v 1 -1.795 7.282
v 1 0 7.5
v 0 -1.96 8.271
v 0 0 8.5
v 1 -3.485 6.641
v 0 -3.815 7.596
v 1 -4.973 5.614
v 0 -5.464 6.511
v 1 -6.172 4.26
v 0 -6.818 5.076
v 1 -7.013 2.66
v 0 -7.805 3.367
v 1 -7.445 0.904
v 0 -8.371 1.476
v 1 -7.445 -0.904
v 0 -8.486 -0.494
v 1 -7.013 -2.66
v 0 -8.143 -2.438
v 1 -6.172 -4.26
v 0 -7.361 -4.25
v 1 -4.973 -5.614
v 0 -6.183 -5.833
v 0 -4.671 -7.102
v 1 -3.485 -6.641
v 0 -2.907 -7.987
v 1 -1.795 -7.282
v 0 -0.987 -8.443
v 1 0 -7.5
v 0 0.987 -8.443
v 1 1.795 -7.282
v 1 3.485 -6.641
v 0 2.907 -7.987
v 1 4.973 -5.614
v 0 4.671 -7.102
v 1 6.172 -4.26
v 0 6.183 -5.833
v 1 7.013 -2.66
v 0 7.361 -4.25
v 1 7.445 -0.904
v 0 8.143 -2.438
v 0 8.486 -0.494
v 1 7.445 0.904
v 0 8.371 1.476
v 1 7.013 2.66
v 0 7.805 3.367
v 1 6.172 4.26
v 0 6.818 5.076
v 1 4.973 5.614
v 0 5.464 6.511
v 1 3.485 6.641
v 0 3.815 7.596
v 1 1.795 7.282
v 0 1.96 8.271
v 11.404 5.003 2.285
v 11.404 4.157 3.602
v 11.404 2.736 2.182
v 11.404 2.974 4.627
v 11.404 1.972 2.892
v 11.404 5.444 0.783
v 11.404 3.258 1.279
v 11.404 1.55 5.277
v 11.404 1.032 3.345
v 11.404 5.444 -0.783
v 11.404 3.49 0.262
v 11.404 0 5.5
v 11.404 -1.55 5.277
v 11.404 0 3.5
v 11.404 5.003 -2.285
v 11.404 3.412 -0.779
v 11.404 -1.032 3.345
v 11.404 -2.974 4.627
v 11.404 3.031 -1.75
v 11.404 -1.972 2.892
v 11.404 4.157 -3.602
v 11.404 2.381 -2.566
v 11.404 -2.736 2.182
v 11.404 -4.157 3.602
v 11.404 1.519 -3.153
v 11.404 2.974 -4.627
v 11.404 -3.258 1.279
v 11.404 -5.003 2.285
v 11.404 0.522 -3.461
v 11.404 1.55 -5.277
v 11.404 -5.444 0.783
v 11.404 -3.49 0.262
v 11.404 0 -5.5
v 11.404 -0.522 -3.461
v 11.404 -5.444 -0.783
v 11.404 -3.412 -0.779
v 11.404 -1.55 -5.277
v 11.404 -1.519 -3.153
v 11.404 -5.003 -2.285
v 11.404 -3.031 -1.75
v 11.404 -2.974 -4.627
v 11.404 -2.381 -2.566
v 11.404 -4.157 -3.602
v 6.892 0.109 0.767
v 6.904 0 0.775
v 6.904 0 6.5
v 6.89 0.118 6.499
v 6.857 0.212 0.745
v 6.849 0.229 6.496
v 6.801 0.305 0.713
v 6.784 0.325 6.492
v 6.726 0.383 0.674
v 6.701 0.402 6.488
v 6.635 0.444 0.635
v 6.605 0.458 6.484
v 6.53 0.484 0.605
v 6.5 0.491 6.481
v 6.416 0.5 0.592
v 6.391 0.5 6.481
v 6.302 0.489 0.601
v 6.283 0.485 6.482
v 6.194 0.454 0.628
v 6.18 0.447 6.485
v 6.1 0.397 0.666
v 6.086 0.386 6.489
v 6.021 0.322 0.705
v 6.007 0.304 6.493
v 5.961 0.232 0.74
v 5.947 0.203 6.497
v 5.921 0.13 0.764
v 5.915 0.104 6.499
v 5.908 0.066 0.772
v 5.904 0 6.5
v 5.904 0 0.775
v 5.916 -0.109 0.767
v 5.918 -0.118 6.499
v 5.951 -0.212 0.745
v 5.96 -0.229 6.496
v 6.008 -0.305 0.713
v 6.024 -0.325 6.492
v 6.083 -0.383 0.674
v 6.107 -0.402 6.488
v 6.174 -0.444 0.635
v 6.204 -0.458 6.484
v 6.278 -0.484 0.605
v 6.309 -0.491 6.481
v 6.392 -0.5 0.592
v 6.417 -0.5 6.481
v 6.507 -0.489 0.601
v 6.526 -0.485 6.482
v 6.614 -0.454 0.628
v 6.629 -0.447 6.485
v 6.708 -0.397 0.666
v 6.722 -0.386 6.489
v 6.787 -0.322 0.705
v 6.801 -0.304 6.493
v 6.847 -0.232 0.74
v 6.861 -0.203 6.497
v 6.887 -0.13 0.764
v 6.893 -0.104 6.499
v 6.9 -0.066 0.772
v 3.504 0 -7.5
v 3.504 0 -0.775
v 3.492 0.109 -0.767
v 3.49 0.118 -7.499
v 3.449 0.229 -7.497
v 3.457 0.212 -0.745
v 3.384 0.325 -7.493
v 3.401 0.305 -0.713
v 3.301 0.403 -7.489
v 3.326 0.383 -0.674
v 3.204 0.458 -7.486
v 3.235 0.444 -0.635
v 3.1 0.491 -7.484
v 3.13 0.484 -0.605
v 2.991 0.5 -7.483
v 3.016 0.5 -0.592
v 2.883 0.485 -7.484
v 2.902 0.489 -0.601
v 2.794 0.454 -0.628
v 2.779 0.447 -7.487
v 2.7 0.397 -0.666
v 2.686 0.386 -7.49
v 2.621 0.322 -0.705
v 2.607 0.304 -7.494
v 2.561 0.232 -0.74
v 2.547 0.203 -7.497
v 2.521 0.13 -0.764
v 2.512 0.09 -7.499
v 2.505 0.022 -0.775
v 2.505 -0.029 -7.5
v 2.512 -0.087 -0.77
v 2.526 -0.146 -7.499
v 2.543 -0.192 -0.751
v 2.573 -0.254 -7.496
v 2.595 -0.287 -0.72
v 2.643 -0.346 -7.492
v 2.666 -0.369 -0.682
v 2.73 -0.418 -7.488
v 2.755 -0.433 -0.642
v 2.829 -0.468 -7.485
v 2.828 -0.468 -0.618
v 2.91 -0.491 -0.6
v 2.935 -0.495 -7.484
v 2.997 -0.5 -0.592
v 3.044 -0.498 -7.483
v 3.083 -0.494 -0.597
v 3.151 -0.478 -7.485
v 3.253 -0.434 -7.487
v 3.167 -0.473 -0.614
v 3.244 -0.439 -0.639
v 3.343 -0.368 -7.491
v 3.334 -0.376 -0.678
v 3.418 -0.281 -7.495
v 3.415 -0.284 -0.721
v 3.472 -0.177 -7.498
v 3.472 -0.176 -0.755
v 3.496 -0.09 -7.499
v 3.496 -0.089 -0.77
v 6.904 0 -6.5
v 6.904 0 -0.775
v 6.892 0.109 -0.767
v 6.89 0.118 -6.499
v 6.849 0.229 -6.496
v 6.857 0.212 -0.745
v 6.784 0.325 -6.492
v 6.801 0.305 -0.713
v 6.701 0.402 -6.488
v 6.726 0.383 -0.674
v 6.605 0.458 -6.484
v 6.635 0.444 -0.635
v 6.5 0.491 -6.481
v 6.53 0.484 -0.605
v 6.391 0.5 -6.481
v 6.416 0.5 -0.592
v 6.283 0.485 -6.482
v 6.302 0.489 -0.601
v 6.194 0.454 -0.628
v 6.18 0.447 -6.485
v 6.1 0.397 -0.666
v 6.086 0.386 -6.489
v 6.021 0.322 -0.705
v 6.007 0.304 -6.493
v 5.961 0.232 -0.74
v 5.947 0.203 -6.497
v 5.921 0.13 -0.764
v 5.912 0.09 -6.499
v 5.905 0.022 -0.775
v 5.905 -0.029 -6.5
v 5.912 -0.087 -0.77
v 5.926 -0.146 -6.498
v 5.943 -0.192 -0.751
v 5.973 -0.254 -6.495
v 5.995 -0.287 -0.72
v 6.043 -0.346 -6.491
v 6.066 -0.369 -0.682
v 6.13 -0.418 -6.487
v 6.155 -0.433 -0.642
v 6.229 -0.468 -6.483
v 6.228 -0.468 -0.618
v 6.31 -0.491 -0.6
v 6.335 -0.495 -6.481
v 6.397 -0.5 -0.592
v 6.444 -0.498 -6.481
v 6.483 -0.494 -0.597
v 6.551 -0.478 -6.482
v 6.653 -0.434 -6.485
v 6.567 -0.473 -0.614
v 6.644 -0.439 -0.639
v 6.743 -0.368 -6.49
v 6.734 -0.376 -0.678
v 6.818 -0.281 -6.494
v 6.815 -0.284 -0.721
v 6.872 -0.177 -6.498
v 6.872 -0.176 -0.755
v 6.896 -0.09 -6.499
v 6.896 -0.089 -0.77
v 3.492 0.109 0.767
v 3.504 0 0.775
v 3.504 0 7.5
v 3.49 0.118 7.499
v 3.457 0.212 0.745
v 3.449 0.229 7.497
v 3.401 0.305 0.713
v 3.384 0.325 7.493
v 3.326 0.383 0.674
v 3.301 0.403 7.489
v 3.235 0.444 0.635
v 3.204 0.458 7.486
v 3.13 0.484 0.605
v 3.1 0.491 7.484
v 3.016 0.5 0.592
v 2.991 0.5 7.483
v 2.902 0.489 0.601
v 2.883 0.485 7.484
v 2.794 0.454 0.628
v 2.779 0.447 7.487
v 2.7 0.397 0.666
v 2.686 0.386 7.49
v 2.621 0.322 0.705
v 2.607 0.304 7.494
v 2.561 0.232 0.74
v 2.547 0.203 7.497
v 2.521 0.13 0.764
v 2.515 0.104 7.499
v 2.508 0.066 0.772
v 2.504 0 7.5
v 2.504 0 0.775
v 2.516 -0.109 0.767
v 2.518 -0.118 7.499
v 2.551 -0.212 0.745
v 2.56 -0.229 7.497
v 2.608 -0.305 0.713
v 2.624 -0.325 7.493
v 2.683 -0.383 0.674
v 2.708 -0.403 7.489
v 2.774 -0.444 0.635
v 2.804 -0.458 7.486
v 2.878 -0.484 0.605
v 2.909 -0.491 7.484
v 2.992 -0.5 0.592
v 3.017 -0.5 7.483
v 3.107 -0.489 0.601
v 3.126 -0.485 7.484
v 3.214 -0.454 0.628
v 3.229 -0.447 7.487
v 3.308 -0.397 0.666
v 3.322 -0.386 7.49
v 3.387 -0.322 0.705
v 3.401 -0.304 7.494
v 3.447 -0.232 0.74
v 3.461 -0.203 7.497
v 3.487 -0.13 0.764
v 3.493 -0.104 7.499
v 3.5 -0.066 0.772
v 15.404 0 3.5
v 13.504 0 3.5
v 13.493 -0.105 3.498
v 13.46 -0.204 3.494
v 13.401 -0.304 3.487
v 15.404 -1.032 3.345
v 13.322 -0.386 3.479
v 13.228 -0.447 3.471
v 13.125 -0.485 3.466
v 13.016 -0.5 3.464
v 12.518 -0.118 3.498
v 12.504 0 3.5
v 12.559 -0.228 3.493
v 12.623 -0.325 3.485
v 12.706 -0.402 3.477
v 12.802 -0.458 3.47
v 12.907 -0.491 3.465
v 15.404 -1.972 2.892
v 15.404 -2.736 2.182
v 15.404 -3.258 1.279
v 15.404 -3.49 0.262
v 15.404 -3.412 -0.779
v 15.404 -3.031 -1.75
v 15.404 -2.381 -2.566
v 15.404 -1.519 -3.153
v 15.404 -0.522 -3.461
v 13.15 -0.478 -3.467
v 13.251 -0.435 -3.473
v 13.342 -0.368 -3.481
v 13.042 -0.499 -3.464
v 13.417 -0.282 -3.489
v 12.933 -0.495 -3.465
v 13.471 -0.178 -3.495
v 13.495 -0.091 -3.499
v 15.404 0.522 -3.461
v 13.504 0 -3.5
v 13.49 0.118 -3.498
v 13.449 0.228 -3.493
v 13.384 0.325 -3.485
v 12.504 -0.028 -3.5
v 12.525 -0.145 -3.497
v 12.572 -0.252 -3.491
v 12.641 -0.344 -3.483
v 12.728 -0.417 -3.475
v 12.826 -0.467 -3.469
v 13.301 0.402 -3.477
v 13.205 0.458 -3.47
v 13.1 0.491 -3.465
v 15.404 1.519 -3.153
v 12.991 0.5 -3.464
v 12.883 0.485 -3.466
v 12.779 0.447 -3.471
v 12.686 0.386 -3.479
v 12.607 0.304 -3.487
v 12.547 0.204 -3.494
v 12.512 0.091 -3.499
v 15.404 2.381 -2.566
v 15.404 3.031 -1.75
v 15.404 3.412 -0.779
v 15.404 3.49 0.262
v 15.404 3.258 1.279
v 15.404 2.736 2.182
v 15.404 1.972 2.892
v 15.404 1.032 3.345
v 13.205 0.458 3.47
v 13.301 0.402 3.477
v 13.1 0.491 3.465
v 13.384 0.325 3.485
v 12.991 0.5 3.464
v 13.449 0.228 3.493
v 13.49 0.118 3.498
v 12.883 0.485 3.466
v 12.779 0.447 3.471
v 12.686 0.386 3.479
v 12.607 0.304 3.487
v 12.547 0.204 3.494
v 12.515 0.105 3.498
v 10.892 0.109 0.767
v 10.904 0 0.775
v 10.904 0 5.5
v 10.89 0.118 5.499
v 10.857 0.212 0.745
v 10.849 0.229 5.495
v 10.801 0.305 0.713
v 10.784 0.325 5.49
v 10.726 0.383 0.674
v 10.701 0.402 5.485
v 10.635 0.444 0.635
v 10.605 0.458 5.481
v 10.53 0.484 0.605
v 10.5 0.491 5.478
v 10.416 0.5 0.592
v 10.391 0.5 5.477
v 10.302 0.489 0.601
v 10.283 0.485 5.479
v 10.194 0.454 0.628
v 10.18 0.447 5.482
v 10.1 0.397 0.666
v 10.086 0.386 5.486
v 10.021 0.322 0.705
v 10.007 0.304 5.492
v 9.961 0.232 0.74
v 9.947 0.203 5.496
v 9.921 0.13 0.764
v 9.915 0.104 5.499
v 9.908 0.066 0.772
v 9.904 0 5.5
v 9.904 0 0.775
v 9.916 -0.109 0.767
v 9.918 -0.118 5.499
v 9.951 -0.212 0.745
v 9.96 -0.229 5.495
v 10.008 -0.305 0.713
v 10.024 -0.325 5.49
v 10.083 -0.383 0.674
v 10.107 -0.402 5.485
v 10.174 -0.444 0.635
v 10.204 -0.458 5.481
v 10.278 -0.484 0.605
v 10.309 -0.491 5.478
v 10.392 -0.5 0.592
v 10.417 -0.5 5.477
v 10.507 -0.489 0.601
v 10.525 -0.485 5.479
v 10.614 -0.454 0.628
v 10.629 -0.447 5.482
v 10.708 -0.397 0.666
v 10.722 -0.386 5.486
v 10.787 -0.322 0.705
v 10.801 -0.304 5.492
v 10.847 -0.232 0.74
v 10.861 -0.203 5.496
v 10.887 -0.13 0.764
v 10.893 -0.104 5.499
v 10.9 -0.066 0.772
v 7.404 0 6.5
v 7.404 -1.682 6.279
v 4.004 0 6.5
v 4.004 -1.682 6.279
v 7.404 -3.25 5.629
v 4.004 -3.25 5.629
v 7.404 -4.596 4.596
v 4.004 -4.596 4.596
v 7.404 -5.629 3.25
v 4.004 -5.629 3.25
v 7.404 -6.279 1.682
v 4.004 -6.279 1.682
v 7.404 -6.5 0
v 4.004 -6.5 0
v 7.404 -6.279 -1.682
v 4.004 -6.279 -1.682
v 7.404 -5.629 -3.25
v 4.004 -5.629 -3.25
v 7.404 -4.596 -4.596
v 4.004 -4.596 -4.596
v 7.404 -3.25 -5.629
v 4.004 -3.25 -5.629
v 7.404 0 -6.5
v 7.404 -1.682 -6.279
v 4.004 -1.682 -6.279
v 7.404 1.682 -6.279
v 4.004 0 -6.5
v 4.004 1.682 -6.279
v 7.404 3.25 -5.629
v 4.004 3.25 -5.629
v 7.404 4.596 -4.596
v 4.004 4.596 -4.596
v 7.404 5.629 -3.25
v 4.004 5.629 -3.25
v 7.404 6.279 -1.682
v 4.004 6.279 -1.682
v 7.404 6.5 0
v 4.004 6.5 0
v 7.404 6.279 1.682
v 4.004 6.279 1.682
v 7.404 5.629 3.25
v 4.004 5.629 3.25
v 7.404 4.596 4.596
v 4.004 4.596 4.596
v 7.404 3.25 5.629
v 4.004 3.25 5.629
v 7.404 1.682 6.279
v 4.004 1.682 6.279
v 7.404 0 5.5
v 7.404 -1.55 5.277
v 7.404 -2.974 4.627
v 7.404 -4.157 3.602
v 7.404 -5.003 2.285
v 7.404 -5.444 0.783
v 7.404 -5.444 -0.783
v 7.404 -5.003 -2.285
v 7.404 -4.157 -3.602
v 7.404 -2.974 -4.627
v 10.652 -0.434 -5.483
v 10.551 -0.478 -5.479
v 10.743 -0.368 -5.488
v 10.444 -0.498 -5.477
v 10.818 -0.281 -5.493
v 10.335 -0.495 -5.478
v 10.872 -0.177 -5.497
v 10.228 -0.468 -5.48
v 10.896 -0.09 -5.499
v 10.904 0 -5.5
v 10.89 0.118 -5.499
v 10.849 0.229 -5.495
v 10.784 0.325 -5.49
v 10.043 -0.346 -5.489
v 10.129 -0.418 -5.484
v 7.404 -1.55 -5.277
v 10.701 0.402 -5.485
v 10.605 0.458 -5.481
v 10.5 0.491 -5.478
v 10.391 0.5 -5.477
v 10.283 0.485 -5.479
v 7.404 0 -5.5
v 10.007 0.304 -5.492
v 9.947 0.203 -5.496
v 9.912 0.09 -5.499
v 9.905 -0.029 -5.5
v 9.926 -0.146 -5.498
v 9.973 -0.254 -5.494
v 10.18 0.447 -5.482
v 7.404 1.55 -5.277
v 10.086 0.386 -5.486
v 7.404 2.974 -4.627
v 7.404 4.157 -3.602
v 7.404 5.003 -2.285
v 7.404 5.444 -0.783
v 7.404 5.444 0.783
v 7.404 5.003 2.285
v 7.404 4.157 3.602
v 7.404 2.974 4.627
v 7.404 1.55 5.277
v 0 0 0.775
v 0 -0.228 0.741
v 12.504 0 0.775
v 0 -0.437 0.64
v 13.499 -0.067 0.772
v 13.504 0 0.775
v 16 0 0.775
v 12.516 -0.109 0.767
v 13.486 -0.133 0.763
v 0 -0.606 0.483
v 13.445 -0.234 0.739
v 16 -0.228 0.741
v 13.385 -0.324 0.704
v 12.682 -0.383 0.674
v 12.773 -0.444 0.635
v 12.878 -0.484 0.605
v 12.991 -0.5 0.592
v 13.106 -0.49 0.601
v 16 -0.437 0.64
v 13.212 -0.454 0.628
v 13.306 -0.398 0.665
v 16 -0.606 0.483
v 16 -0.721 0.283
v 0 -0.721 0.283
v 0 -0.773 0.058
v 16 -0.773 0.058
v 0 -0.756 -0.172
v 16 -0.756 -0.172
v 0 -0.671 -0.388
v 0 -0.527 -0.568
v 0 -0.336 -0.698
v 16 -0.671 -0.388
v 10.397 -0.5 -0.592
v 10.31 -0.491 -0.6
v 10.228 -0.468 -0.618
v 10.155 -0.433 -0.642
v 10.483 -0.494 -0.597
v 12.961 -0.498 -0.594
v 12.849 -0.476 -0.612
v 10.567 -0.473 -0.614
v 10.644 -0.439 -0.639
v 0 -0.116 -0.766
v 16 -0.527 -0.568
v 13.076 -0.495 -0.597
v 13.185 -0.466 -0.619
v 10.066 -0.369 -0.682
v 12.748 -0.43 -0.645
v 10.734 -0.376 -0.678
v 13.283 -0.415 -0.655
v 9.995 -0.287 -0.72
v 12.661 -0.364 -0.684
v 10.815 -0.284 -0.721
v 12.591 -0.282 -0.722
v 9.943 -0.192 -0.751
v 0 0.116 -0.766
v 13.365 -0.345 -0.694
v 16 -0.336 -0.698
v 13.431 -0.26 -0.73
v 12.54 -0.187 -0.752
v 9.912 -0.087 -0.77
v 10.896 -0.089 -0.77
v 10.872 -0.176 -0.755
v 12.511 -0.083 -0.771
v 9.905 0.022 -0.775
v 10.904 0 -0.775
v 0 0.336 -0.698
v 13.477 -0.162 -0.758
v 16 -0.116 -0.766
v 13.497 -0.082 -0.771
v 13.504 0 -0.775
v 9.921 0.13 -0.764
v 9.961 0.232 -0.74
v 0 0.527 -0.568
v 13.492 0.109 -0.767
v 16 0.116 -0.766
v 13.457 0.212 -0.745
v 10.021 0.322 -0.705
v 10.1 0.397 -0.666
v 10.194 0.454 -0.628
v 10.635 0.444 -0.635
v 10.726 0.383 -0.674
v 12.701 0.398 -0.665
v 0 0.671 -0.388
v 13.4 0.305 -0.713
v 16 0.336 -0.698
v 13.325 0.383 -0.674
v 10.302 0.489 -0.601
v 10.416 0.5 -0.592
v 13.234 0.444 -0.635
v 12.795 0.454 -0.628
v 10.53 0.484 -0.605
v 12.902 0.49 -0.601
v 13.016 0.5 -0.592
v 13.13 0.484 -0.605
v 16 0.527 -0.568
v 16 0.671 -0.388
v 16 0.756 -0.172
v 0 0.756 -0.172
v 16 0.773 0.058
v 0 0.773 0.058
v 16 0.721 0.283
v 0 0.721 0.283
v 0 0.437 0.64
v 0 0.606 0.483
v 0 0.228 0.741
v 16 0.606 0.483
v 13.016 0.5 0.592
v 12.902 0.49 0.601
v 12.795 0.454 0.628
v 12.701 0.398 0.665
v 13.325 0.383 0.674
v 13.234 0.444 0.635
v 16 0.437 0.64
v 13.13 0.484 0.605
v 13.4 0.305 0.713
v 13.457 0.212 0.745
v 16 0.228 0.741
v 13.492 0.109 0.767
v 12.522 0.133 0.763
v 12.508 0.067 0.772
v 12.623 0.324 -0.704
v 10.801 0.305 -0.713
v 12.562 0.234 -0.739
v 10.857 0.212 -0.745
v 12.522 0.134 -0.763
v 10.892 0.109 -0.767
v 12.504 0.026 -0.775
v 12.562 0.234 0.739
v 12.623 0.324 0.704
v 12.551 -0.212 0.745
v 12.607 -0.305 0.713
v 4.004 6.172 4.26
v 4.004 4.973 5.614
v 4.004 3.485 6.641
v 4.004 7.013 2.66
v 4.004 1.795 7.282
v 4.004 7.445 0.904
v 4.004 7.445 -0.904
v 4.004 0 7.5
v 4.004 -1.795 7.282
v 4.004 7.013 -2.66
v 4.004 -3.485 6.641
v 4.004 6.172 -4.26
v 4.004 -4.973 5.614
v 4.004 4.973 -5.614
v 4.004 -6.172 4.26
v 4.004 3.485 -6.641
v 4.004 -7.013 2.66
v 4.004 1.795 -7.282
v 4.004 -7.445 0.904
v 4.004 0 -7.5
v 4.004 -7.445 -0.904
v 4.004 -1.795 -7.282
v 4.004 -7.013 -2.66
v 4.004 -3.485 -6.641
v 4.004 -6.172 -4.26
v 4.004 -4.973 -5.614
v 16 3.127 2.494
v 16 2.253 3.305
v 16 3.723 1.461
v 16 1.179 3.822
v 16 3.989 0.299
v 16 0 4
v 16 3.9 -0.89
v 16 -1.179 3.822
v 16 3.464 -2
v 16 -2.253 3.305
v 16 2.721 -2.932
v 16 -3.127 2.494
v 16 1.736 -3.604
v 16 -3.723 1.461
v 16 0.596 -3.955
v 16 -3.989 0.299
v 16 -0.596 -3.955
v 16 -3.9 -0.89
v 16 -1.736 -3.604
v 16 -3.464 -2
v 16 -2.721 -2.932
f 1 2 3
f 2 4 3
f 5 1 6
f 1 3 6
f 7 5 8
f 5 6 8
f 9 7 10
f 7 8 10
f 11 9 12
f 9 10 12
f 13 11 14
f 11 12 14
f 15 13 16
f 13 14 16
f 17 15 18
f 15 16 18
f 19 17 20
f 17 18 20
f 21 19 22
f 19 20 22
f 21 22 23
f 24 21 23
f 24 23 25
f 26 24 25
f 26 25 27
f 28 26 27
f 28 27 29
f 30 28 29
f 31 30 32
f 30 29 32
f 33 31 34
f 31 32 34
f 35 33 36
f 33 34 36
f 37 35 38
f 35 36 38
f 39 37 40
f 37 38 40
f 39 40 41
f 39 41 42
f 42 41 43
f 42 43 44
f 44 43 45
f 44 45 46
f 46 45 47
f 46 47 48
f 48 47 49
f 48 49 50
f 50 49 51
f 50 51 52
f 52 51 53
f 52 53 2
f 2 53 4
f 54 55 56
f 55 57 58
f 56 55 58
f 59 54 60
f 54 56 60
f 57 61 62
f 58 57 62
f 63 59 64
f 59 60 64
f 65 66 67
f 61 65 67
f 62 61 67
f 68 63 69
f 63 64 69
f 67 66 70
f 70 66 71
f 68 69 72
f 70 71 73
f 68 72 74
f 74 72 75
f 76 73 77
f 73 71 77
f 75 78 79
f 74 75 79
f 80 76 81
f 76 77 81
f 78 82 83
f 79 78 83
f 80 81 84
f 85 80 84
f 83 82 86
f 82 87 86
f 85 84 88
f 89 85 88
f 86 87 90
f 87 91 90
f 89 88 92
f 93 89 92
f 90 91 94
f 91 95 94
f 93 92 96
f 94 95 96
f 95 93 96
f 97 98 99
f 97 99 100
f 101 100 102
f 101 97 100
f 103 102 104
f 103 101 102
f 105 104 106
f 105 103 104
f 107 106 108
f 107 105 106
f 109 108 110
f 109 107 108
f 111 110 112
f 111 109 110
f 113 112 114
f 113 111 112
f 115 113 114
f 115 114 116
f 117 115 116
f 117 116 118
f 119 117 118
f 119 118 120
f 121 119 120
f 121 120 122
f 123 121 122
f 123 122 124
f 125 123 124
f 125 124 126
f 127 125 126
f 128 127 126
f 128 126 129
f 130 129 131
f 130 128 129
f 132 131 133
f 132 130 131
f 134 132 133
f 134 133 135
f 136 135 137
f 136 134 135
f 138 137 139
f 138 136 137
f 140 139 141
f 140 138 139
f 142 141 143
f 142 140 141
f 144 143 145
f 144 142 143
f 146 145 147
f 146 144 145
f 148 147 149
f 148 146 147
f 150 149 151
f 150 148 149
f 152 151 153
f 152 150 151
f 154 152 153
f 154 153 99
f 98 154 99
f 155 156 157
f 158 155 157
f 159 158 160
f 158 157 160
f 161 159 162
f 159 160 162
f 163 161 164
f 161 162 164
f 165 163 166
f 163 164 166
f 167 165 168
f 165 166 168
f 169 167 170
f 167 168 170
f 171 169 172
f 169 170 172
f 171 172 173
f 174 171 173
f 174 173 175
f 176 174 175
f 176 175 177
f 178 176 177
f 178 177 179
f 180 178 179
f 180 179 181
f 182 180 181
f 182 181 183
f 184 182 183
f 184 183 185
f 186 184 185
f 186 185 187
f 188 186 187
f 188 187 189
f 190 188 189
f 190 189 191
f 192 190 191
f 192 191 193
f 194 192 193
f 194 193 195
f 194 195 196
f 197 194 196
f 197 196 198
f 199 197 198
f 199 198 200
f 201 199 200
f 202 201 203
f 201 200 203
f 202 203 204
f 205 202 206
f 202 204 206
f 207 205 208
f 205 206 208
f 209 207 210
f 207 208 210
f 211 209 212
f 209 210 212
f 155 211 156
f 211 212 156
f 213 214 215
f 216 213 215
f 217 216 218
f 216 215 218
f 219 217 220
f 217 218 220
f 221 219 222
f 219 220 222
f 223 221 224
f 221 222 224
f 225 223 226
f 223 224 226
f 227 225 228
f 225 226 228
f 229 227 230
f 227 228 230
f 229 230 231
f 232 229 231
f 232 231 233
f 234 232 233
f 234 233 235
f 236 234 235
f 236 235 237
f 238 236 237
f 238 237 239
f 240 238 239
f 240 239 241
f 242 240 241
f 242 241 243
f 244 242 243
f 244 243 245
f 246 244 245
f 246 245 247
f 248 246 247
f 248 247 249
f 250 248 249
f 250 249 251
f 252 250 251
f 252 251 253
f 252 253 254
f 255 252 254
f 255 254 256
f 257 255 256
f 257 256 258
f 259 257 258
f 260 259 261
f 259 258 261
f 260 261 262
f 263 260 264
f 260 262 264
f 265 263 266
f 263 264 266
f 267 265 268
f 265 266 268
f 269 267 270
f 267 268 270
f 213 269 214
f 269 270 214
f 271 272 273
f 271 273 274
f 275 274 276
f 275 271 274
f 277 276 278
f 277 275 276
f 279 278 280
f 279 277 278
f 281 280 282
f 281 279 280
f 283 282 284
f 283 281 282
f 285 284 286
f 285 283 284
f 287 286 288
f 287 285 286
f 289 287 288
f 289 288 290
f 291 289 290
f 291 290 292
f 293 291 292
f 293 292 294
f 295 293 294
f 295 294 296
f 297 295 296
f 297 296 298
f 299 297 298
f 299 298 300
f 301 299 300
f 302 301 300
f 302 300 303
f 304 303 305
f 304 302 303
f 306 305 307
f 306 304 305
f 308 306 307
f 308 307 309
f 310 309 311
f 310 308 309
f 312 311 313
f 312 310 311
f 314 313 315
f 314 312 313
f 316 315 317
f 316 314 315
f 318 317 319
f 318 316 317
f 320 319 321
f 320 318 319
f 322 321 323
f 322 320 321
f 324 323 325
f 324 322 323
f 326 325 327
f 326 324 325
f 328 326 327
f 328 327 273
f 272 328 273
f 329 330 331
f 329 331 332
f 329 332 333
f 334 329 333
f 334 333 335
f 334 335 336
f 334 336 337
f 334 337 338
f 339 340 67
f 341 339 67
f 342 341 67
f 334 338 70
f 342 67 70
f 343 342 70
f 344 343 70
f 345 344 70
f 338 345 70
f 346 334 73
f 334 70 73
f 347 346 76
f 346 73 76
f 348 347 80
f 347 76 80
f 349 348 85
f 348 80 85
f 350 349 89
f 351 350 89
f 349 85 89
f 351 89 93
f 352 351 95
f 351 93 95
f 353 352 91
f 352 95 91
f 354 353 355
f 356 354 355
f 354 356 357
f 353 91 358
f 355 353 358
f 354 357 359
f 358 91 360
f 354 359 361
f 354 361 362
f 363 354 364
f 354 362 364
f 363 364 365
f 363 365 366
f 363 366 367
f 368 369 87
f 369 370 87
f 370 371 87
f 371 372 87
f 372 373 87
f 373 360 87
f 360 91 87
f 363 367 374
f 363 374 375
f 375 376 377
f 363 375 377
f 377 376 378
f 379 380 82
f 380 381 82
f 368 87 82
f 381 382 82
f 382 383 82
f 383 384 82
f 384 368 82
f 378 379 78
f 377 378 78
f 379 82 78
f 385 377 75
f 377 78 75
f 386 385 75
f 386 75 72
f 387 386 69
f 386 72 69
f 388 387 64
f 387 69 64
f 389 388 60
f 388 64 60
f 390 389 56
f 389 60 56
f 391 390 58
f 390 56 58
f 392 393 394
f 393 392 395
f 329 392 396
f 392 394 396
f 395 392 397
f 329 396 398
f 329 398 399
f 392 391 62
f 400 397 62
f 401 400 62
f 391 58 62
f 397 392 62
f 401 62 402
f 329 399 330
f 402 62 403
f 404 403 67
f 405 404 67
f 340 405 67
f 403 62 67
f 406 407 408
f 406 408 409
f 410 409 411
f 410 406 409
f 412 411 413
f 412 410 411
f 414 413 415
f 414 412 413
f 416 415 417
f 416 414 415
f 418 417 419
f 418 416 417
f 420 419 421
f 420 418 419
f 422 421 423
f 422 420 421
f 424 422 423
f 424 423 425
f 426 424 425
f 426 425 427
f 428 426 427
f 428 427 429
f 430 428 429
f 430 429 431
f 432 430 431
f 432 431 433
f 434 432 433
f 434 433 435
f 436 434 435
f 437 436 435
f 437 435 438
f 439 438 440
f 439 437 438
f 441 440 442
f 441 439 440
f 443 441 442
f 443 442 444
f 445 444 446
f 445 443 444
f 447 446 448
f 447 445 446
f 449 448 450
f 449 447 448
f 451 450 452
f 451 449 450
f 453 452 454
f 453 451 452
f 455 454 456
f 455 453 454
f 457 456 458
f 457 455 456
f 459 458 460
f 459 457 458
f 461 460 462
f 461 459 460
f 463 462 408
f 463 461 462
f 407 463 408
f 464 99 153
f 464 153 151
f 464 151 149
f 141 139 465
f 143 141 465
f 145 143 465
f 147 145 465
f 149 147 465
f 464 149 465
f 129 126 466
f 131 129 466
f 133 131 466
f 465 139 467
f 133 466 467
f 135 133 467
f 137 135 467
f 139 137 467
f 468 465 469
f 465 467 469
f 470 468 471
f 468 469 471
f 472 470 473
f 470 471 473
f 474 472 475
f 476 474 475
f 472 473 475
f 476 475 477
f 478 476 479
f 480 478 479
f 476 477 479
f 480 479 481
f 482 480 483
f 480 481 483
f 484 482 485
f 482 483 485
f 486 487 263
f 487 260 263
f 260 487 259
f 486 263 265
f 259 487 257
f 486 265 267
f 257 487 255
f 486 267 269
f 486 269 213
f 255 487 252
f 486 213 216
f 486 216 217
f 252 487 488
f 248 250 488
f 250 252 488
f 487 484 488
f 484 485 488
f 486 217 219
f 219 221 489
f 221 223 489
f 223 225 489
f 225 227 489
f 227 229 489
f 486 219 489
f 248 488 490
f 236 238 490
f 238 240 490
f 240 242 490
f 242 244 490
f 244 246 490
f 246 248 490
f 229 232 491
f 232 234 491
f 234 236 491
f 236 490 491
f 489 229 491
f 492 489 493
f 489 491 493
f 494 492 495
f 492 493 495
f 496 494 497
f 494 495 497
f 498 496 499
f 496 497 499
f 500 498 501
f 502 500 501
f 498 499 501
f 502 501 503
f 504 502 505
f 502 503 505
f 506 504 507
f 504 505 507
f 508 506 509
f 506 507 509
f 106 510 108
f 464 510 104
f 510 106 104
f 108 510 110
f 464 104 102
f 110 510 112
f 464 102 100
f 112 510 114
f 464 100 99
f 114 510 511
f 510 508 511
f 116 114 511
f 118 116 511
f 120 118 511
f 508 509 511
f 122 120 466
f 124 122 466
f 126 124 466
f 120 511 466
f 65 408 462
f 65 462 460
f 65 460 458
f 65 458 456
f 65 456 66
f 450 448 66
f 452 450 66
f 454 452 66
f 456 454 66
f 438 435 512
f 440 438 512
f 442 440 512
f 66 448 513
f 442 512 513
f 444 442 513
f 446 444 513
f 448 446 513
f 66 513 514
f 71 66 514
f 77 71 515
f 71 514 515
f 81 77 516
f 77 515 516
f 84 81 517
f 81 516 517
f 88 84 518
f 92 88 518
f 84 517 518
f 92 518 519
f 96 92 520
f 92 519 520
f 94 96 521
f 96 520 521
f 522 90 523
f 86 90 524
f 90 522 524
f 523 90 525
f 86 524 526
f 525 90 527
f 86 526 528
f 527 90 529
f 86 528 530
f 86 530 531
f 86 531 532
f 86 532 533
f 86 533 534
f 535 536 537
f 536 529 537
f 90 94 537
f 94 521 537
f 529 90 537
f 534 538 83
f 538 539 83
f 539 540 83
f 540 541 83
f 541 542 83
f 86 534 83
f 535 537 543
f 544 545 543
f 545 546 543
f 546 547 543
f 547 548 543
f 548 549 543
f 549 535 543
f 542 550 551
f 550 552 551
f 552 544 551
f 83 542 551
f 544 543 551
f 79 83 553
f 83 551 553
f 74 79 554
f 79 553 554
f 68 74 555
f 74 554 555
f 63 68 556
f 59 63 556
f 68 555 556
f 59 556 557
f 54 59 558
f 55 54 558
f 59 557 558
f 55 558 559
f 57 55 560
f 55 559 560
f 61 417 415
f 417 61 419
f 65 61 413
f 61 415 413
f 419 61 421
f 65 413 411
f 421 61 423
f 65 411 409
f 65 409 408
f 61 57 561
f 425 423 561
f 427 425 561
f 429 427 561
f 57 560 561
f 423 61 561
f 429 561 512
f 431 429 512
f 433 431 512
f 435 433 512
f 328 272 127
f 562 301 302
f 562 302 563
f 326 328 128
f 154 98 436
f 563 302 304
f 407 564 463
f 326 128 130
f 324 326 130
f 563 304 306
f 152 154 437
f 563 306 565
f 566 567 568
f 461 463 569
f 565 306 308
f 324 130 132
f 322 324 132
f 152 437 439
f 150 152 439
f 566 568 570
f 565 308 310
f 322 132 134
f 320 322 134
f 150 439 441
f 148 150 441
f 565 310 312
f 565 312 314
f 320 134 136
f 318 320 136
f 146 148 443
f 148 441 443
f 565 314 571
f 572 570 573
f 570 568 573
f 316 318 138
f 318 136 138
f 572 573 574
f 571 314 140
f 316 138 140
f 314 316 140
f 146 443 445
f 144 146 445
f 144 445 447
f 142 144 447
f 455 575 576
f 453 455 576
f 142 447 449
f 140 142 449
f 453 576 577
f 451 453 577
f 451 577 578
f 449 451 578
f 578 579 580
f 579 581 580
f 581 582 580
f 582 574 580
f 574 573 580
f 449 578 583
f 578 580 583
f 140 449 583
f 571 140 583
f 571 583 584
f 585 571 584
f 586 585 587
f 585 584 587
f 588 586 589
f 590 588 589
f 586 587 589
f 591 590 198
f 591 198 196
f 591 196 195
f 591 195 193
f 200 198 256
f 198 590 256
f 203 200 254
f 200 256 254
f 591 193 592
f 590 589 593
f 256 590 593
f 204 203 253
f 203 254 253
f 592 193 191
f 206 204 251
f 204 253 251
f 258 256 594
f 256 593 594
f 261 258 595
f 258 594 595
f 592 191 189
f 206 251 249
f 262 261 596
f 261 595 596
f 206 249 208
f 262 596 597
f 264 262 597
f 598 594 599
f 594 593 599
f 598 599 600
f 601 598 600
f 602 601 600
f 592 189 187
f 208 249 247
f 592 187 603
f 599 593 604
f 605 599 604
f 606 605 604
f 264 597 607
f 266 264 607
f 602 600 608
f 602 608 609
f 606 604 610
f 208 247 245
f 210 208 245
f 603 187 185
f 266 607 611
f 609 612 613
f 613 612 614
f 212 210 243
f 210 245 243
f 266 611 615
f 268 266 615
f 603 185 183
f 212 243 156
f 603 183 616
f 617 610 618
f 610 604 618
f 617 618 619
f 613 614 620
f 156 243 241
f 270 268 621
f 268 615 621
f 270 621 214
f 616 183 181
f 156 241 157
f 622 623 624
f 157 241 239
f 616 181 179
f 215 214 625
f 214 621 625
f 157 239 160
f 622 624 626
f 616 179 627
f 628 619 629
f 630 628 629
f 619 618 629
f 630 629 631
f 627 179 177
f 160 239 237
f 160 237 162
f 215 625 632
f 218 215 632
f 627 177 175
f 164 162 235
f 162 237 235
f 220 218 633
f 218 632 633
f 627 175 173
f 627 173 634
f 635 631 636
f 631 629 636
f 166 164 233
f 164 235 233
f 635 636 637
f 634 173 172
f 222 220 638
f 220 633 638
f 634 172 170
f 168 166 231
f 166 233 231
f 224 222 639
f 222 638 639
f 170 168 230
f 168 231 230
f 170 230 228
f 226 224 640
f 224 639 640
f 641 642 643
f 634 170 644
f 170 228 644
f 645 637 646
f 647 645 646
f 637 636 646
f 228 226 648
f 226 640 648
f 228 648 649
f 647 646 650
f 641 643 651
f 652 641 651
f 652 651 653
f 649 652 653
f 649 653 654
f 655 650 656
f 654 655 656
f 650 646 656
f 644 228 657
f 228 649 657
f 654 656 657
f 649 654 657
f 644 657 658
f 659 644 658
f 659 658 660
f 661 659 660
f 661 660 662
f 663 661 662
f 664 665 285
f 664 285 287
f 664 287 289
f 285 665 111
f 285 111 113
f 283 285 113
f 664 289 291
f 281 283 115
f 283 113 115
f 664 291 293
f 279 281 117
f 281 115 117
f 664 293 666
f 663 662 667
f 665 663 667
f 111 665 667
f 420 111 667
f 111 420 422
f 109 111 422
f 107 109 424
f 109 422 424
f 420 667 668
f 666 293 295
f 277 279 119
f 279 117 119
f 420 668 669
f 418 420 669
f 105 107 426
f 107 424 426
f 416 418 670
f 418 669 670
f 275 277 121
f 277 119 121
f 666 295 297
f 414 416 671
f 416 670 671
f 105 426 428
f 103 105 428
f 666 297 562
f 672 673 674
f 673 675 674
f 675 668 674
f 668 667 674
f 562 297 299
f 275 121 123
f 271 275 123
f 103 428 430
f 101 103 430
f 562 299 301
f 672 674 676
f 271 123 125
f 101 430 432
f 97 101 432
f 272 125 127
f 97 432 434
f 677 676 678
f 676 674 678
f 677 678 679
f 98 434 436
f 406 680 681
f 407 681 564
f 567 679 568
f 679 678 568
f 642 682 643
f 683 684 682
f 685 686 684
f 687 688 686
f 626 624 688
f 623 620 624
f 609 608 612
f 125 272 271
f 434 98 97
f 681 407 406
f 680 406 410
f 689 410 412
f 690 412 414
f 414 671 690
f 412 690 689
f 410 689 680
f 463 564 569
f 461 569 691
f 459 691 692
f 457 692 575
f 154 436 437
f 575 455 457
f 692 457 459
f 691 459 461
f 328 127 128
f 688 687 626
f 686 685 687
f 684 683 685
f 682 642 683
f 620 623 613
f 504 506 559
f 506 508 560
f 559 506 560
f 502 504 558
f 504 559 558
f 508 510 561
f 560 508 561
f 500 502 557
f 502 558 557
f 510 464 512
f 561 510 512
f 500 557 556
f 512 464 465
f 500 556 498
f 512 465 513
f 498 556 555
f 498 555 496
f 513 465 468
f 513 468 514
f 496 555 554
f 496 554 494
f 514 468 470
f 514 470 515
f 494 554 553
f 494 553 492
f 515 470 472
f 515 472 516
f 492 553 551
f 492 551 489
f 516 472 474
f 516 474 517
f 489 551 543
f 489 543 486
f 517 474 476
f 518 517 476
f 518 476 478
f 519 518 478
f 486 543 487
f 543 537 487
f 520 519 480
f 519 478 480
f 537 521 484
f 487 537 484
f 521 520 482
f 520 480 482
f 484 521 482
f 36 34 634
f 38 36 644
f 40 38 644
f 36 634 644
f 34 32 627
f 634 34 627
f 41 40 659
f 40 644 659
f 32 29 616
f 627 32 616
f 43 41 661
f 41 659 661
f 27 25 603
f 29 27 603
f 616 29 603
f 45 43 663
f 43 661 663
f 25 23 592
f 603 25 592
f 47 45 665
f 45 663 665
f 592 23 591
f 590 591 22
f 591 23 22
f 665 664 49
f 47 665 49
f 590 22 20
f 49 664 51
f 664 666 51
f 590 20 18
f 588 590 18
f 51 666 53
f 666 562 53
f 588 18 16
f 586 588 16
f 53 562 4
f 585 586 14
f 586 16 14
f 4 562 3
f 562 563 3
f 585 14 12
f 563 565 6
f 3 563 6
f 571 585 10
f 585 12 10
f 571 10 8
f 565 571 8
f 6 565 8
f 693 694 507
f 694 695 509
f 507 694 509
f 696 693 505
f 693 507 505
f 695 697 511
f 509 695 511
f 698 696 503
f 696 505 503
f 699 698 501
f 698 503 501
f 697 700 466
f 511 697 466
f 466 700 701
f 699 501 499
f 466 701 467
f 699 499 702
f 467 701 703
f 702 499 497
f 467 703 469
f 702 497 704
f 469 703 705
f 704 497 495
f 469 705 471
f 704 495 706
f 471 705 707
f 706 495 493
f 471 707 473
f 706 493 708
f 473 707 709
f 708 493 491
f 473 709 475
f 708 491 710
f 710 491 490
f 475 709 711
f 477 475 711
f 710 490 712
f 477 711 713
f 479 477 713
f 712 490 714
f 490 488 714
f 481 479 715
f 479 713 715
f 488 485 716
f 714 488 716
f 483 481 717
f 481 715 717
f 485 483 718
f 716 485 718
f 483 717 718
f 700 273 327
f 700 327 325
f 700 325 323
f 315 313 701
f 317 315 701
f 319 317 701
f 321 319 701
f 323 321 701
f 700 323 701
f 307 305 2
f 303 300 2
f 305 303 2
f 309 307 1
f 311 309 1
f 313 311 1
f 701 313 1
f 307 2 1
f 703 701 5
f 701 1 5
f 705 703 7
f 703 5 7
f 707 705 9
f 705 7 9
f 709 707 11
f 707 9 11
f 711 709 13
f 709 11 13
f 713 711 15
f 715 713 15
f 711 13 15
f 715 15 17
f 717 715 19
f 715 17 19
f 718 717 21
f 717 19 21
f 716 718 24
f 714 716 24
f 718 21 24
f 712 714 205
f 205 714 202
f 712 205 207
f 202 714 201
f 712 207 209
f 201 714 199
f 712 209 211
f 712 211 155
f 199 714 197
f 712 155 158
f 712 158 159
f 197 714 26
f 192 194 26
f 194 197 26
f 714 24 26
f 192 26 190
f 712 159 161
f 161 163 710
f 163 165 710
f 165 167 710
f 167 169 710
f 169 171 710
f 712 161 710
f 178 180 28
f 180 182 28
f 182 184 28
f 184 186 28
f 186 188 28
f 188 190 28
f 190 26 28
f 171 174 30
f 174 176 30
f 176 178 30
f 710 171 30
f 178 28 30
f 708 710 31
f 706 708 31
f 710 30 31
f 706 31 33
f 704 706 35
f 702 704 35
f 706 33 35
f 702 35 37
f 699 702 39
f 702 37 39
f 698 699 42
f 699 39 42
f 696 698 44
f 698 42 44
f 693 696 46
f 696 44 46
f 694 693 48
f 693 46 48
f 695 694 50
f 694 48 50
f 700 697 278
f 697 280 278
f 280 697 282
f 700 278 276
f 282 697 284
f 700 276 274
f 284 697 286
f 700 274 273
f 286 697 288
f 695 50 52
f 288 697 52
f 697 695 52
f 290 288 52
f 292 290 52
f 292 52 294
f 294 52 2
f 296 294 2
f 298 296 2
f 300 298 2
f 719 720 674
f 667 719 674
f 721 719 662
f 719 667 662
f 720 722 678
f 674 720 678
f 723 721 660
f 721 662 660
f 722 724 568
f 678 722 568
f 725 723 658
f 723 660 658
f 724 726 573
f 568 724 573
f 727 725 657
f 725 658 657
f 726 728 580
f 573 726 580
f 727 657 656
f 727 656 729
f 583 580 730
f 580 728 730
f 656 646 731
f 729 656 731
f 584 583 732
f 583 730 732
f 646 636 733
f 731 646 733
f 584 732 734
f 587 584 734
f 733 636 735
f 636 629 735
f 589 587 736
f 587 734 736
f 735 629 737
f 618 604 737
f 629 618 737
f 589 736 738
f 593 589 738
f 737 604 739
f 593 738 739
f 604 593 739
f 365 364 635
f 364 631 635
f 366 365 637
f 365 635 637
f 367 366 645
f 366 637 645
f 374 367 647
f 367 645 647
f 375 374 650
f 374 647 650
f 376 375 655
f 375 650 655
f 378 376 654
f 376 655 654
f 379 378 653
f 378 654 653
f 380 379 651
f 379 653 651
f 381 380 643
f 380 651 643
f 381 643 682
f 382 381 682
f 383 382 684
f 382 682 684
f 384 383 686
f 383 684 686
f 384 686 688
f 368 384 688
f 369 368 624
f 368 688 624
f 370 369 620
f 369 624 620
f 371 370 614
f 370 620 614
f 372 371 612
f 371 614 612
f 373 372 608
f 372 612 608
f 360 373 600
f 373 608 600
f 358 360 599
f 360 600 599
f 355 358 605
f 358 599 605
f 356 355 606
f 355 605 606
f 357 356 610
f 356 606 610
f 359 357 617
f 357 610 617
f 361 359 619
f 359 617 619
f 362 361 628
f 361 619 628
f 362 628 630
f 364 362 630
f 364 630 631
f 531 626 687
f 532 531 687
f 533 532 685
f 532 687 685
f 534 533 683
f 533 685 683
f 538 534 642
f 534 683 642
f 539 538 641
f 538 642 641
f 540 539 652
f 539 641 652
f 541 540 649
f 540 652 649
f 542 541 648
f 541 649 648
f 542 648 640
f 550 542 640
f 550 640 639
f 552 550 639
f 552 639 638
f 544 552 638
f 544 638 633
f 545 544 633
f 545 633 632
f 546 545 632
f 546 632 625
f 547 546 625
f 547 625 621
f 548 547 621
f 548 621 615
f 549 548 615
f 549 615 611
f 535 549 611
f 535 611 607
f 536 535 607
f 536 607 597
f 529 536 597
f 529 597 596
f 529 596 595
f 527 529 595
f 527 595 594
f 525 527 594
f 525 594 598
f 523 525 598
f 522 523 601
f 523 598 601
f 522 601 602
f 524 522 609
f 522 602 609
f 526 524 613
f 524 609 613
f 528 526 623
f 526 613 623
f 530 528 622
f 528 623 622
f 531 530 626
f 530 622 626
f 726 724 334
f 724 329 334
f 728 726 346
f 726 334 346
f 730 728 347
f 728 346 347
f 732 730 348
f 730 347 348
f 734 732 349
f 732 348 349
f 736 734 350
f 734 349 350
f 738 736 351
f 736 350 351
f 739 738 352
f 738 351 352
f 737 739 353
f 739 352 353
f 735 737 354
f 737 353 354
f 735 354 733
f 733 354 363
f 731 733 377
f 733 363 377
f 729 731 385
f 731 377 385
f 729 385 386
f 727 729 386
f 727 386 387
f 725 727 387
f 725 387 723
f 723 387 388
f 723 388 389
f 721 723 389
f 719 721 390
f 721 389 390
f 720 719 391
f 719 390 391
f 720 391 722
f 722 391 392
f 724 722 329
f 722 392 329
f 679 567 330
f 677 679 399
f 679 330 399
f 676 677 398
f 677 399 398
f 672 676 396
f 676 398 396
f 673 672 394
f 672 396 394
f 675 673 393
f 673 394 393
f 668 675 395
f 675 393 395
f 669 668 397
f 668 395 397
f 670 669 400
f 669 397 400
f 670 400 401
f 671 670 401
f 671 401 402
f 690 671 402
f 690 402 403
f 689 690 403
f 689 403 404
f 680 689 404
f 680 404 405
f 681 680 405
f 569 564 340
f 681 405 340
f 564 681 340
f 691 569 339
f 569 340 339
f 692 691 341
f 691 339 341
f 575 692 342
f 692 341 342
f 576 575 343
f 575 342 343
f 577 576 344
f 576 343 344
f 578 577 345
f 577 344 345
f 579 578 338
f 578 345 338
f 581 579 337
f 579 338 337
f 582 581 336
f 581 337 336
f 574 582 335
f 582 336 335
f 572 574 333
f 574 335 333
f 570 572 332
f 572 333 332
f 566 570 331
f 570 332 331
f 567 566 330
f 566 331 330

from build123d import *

# Parameters (mm, degrees)
F2_R     = 0.5
F3_DEPTH = 12.5


with BuildPart() as f1:
    # F0 (on Front) → F1 (revolve)
    with BuildSketch(Plane.XZ):
        Polygon((1, 7.5), (0, 8.5), (0, 0.775), (16, 0.775), (16, 4), (15.404123, 3.5), (11.404123, 3.5), (11.404123, 5.5), (7.404123, 5.5), (7.404123, 6.5), (4.004123, 6.5), (4.004123, 7.5), align=None)
    revolve(axis=Axis((6.044726, 0, 0), (1, 0, 0)))

    # F2 (on Top) → F3 (cut, symmetric)
    with BuildSketch(Plane.XY):
        with Locations((3.004123, 0)):
            Circle(F2_R)
        with Locations((6.404123, 0)):
            Circle(F2_R)
        with Locations((10.404123, 0)):
            Circle(F2_R)
        with Locations((13.003722, 0)):
            Circle(F2_R)
    extrude(amount=F3_DEPTH, both=True, mode=Mode.SUBTRACT)


solid = f1.part
